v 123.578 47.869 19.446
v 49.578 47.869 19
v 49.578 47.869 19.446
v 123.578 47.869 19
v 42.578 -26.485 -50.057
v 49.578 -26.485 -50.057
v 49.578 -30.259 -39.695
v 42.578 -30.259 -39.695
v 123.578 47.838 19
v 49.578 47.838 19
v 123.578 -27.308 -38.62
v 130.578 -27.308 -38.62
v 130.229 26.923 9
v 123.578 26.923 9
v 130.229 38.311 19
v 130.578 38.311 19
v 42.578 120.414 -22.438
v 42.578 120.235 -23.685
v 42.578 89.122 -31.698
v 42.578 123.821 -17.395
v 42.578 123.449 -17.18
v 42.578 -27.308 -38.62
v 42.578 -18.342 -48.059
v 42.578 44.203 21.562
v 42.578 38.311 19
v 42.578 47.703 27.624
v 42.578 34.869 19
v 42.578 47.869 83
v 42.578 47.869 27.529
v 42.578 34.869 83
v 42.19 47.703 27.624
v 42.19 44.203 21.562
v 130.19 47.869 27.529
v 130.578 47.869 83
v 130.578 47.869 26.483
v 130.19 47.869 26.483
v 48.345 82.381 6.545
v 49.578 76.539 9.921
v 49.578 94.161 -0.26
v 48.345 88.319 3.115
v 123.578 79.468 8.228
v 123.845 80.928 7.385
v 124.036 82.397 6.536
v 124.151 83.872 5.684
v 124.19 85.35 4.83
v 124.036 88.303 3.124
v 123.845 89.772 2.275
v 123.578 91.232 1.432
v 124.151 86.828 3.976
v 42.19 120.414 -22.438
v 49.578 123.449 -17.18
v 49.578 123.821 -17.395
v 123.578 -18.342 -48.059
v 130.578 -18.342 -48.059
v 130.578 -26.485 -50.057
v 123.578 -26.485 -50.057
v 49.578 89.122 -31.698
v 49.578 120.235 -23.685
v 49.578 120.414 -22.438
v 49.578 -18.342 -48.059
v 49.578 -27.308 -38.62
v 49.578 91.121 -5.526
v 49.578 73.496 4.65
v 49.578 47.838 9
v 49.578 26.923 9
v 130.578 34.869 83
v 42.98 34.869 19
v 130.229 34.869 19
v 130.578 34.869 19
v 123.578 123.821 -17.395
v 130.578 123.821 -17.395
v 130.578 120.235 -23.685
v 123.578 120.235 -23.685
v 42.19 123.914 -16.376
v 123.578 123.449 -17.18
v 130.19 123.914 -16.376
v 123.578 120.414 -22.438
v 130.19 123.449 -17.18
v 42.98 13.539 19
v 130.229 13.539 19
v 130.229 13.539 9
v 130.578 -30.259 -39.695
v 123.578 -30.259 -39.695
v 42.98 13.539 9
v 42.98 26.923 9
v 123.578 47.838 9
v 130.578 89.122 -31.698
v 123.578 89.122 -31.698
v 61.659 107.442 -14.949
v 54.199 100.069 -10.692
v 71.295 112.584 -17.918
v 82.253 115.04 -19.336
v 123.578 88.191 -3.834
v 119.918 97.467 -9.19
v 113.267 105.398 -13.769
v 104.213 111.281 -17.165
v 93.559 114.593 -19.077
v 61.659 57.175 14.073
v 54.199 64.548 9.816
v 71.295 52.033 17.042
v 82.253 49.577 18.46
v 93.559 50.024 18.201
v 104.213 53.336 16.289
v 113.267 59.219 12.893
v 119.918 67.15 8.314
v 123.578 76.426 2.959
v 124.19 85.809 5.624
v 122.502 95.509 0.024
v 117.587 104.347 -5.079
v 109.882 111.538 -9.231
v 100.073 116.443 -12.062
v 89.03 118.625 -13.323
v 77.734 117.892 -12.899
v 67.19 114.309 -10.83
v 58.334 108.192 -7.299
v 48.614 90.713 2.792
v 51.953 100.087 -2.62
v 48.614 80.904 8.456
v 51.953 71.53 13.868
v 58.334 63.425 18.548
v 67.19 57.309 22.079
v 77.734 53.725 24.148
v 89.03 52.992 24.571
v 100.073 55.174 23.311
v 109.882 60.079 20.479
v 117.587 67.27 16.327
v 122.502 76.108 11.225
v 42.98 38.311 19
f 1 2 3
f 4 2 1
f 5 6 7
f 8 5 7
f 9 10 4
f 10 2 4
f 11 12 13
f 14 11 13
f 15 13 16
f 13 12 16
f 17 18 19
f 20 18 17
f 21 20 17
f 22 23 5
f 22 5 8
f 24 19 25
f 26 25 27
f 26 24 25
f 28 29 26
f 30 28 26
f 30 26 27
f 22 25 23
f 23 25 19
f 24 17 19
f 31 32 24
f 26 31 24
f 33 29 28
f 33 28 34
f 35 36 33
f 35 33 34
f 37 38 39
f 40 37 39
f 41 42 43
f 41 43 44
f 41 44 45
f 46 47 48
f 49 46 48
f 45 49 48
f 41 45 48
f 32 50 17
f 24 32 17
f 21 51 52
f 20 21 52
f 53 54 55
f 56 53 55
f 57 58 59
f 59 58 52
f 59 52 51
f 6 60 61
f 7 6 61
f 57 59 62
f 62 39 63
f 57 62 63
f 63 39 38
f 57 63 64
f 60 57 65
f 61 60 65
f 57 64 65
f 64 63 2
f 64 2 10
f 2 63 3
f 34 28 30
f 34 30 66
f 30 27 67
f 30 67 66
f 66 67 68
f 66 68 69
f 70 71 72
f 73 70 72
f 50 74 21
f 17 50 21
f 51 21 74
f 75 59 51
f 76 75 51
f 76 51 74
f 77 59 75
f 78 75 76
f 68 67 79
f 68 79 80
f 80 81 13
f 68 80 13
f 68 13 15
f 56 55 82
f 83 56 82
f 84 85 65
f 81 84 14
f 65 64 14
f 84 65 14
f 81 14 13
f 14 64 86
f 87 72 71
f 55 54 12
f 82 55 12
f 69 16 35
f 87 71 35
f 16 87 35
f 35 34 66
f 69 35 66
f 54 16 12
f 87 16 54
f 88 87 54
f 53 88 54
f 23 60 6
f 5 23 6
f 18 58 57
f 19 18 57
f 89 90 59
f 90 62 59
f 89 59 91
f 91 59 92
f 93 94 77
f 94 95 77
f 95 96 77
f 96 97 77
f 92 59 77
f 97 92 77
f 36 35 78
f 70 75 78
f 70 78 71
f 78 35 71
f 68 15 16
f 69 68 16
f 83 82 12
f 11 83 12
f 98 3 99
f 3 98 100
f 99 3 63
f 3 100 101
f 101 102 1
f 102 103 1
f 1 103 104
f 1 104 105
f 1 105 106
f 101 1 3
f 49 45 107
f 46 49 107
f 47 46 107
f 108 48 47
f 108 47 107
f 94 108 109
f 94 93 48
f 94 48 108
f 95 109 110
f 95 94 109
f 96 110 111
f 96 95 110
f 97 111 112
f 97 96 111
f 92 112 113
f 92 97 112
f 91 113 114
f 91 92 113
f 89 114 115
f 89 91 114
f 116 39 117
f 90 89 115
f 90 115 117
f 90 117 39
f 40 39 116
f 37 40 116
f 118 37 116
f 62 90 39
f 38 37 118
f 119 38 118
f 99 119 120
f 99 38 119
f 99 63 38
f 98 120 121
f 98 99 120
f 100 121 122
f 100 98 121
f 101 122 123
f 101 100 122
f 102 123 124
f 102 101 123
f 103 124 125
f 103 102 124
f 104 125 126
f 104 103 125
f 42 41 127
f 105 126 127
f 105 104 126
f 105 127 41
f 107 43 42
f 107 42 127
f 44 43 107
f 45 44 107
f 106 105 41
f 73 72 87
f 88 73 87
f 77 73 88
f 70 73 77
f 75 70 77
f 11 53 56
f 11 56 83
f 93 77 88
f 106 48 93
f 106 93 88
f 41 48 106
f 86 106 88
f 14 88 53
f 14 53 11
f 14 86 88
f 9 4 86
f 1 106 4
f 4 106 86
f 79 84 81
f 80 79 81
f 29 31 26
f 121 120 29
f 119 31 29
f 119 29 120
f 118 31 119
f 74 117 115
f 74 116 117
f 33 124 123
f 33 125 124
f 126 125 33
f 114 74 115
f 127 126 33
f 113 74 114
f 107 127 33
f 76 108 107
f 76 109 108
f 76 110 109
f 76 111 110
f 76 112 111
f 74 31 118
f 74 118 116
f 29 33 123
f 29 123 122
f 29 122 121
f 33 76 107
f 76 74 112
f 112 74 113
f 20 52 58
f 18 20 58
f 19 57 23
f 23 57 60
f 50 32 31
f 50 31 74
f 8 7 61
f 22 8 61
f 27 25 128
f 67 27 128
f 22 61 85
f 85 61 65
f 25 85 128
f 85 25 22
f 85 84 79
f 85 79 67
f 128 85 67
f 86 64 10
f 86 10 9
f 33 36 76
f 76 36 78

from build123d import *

# Parameters (mm, degrees)
EXTRUDE008_DEPTH                          = 7
EXTRUDE008_ONTO_SKETCH008_ROLL_ANGLE      = 90
EXTRUDE008_ONTO_SKETCH008_PITCH_ANGLE     = -30
EXTRUDE008_ONTO_SKETCH008_PLACEMENT_ANGLE = -90
SKETCH004_W                               = 87.248978
SKETCH004_H                               = 34.299007
EXTRUDE004_DEPTH                          = 10
EXTRUDE006_DEPTH                          = 7
EXTRUDE006_ONTO_SKETCH_ROLL_ANGLE         = 90
EXTRUDE006_ONTO_SKETCH_PITCH_ANGLE        = -30
EXTRUDE006_ONTO_SKETCH_PLACEMENT_ANGLE    = -90
SKETCH007_W                               = 88
SKETCH007_H                               = 88
SKETCH007_R                               = 38
EXTRUDE007_DEPTH                          = 7
EXTRUDE007_PLACEMENT_ANGLE                = 30
SKETCH005_W                               = 88
SKETCH005_H                               = 13
EXTRUDE005_DEPTH                          = 64


with BuildPart() as extrude008:
    # Sketch008 as drawn → Extrude008 (new)
    with BuildSketch(Plane.XY):
        Polygon((-123.305188, 6.070855), (-123.344503, -1.169558), (-100.406639, -23.66512), (-15.520081, -91.56636), (-9.4672, -97.367993), (-1.018409, -90.281281), (-3.036737, -87.875028), (-34.868234, 6.09489), align=None)
    extrude(amount=EXTRUDE008_DEPTH)


with BuildPart() as extrude008_1:
    # Extrude008 onto Sketch008 roll: moved
    add(extrude008.part.rotate(Axis((0, 0, 0), (1, 0, 0)), EXTRUDE008_ONTO_SKETCH008_ROLL_ANGLE))


with BuildPart() as extrude008_2:
    # Extrude008 onto Sketch008 pitch: moved
    add(extrude008_1.part.rotate(Axis((0, 0, 0), (0, 1, 0)), EXTRUDE008_ONTO_SKETCH008_PITCH_ANGLE))


with BuildPart() as extrude008_3:
    # Extrude008 onto Sketch008 placement: moved
    add(extrude008_2.part.moved(Location((42.577726, 14, 39))).rotate(Axis((42.577726, 14, 39), (0, 0, 1)), EXTRUDE008_ONTO_SKETCH008_PLACEMENT_ANGLE))


with BuildPart() as extrude008_4:
    # Extrude008 placement: moved
    add(extrude008_3.part.moved(Location((7, 0, 0))))


with BuildPart() as extrude004:
    # Sketch004 → Extrude004 (new body)
    with BuildSketch(Plane.XY):
        with Locations((83.604523, 30.688192)):
            Rectangle(SKETCH004_W, SKETCH004_H)
    extrude(amount=EXTRUDE004_DEPTH)


with BuildPart() as extrude004_1:
    # Extrude004 placement: moved
    add(extrude004.part.moved(Location((3, 0, 9))))


with BuildPart() as extrude006:
    # Sketch as drawn → Extrude006 (new)
    with BuildSketch(Plane.XY):
        Polygon((-123.305188, 6.070855), (-123.344503, -1.169558), (-100.406639, -23.66512), (-15.520081, -91.56636), (-9.4672, -97.367993), (-1.018409, -90.281281), (-3.036737, -87.875028), (-34.868234, 6.09489), align=None)
    extrude(amount=EXTRUDE006_DEPTH)


with BuildPart() as extrude006_1:
    # Extrude006 onto Sketch roll: moved
    add(extrude006.part.rotate(Axis((0, 0, 0), (1, 0, 0)), EXTRUDE006_ONTO_SKETCH_ROLL_ANGLE))


with BuildPart() as extrude006_2:
    # Extrude006 onto Sketch pitch: moved
    add(extrude006_1.part.rotate(Axis((0, 0, 0), (0, 1, 0)), EXTRUDE006_ONTO_SKETCH_PITCH_ANGLE))


with BuildPart() as extrude006_3:
    # Extrude006 onto Sketch placement: moved
    add(extrude006_2.part.moved(Location((42.577726, 14, 39))).rotate(Axis((42.577726, 14, 39), (0, 0, 1)), EXTRUDE006_ONTO_SKETCH_PLACEMENT_ANGLE))


with BuildPart() as extrude006_4:
    # Extrude006 placement: moved
    add(extrude006_3.part.moved(Location((88, 0, 0))))


with BuildPart() as extrude007:
    # Sketch007 → Extrude007 (new body)
    with BuildSketch(Plane.XY):
        with Locations((83.189821, 78.875904)):
            Rectangle(SKETCH007_W, SKETCH007_H)
        with Locations((83.189821, 78.875904)):
            Circle(SKETCH007_R, mode=Mode.SUBTRACT)
    extrude(amount=EXTRUDE007_DEPTH)


with BuildPart() as extrude007_1:
    # Extrude007 placement: moved
    add(extrude007.part.moved(Location((3, 14, 39))).rotate(Axis((3, 14, 39), (-1, 0, 0)), EXTRUDE007_PLACEMENT_ANGLE))


with BuildPart() as suporte2:
    # Sketch005 → Extrude005 (new body)
    with BuildSketch(Plane.XY):
        with Locations((83.577726, 41.368692)):
            Rectangle(SKETCH005_W, SKETCH005_H)
    extrude(amount=EXTRUDE005_DEPTH)


with BuildPart() as suporte2_1:
    # Extrude005 placement: moved
    add(suporte2.part.moved(Location((3, 0, 19))))

    # Fusion: union Extrude008, Extrude004, Extrude006, Extrude007
    add(extrude008_4.part)
    add(extrude004_1.part)
    add(extrude006_4.part)
    add(extrude007_1.part)


solid = suporte2_1.part
